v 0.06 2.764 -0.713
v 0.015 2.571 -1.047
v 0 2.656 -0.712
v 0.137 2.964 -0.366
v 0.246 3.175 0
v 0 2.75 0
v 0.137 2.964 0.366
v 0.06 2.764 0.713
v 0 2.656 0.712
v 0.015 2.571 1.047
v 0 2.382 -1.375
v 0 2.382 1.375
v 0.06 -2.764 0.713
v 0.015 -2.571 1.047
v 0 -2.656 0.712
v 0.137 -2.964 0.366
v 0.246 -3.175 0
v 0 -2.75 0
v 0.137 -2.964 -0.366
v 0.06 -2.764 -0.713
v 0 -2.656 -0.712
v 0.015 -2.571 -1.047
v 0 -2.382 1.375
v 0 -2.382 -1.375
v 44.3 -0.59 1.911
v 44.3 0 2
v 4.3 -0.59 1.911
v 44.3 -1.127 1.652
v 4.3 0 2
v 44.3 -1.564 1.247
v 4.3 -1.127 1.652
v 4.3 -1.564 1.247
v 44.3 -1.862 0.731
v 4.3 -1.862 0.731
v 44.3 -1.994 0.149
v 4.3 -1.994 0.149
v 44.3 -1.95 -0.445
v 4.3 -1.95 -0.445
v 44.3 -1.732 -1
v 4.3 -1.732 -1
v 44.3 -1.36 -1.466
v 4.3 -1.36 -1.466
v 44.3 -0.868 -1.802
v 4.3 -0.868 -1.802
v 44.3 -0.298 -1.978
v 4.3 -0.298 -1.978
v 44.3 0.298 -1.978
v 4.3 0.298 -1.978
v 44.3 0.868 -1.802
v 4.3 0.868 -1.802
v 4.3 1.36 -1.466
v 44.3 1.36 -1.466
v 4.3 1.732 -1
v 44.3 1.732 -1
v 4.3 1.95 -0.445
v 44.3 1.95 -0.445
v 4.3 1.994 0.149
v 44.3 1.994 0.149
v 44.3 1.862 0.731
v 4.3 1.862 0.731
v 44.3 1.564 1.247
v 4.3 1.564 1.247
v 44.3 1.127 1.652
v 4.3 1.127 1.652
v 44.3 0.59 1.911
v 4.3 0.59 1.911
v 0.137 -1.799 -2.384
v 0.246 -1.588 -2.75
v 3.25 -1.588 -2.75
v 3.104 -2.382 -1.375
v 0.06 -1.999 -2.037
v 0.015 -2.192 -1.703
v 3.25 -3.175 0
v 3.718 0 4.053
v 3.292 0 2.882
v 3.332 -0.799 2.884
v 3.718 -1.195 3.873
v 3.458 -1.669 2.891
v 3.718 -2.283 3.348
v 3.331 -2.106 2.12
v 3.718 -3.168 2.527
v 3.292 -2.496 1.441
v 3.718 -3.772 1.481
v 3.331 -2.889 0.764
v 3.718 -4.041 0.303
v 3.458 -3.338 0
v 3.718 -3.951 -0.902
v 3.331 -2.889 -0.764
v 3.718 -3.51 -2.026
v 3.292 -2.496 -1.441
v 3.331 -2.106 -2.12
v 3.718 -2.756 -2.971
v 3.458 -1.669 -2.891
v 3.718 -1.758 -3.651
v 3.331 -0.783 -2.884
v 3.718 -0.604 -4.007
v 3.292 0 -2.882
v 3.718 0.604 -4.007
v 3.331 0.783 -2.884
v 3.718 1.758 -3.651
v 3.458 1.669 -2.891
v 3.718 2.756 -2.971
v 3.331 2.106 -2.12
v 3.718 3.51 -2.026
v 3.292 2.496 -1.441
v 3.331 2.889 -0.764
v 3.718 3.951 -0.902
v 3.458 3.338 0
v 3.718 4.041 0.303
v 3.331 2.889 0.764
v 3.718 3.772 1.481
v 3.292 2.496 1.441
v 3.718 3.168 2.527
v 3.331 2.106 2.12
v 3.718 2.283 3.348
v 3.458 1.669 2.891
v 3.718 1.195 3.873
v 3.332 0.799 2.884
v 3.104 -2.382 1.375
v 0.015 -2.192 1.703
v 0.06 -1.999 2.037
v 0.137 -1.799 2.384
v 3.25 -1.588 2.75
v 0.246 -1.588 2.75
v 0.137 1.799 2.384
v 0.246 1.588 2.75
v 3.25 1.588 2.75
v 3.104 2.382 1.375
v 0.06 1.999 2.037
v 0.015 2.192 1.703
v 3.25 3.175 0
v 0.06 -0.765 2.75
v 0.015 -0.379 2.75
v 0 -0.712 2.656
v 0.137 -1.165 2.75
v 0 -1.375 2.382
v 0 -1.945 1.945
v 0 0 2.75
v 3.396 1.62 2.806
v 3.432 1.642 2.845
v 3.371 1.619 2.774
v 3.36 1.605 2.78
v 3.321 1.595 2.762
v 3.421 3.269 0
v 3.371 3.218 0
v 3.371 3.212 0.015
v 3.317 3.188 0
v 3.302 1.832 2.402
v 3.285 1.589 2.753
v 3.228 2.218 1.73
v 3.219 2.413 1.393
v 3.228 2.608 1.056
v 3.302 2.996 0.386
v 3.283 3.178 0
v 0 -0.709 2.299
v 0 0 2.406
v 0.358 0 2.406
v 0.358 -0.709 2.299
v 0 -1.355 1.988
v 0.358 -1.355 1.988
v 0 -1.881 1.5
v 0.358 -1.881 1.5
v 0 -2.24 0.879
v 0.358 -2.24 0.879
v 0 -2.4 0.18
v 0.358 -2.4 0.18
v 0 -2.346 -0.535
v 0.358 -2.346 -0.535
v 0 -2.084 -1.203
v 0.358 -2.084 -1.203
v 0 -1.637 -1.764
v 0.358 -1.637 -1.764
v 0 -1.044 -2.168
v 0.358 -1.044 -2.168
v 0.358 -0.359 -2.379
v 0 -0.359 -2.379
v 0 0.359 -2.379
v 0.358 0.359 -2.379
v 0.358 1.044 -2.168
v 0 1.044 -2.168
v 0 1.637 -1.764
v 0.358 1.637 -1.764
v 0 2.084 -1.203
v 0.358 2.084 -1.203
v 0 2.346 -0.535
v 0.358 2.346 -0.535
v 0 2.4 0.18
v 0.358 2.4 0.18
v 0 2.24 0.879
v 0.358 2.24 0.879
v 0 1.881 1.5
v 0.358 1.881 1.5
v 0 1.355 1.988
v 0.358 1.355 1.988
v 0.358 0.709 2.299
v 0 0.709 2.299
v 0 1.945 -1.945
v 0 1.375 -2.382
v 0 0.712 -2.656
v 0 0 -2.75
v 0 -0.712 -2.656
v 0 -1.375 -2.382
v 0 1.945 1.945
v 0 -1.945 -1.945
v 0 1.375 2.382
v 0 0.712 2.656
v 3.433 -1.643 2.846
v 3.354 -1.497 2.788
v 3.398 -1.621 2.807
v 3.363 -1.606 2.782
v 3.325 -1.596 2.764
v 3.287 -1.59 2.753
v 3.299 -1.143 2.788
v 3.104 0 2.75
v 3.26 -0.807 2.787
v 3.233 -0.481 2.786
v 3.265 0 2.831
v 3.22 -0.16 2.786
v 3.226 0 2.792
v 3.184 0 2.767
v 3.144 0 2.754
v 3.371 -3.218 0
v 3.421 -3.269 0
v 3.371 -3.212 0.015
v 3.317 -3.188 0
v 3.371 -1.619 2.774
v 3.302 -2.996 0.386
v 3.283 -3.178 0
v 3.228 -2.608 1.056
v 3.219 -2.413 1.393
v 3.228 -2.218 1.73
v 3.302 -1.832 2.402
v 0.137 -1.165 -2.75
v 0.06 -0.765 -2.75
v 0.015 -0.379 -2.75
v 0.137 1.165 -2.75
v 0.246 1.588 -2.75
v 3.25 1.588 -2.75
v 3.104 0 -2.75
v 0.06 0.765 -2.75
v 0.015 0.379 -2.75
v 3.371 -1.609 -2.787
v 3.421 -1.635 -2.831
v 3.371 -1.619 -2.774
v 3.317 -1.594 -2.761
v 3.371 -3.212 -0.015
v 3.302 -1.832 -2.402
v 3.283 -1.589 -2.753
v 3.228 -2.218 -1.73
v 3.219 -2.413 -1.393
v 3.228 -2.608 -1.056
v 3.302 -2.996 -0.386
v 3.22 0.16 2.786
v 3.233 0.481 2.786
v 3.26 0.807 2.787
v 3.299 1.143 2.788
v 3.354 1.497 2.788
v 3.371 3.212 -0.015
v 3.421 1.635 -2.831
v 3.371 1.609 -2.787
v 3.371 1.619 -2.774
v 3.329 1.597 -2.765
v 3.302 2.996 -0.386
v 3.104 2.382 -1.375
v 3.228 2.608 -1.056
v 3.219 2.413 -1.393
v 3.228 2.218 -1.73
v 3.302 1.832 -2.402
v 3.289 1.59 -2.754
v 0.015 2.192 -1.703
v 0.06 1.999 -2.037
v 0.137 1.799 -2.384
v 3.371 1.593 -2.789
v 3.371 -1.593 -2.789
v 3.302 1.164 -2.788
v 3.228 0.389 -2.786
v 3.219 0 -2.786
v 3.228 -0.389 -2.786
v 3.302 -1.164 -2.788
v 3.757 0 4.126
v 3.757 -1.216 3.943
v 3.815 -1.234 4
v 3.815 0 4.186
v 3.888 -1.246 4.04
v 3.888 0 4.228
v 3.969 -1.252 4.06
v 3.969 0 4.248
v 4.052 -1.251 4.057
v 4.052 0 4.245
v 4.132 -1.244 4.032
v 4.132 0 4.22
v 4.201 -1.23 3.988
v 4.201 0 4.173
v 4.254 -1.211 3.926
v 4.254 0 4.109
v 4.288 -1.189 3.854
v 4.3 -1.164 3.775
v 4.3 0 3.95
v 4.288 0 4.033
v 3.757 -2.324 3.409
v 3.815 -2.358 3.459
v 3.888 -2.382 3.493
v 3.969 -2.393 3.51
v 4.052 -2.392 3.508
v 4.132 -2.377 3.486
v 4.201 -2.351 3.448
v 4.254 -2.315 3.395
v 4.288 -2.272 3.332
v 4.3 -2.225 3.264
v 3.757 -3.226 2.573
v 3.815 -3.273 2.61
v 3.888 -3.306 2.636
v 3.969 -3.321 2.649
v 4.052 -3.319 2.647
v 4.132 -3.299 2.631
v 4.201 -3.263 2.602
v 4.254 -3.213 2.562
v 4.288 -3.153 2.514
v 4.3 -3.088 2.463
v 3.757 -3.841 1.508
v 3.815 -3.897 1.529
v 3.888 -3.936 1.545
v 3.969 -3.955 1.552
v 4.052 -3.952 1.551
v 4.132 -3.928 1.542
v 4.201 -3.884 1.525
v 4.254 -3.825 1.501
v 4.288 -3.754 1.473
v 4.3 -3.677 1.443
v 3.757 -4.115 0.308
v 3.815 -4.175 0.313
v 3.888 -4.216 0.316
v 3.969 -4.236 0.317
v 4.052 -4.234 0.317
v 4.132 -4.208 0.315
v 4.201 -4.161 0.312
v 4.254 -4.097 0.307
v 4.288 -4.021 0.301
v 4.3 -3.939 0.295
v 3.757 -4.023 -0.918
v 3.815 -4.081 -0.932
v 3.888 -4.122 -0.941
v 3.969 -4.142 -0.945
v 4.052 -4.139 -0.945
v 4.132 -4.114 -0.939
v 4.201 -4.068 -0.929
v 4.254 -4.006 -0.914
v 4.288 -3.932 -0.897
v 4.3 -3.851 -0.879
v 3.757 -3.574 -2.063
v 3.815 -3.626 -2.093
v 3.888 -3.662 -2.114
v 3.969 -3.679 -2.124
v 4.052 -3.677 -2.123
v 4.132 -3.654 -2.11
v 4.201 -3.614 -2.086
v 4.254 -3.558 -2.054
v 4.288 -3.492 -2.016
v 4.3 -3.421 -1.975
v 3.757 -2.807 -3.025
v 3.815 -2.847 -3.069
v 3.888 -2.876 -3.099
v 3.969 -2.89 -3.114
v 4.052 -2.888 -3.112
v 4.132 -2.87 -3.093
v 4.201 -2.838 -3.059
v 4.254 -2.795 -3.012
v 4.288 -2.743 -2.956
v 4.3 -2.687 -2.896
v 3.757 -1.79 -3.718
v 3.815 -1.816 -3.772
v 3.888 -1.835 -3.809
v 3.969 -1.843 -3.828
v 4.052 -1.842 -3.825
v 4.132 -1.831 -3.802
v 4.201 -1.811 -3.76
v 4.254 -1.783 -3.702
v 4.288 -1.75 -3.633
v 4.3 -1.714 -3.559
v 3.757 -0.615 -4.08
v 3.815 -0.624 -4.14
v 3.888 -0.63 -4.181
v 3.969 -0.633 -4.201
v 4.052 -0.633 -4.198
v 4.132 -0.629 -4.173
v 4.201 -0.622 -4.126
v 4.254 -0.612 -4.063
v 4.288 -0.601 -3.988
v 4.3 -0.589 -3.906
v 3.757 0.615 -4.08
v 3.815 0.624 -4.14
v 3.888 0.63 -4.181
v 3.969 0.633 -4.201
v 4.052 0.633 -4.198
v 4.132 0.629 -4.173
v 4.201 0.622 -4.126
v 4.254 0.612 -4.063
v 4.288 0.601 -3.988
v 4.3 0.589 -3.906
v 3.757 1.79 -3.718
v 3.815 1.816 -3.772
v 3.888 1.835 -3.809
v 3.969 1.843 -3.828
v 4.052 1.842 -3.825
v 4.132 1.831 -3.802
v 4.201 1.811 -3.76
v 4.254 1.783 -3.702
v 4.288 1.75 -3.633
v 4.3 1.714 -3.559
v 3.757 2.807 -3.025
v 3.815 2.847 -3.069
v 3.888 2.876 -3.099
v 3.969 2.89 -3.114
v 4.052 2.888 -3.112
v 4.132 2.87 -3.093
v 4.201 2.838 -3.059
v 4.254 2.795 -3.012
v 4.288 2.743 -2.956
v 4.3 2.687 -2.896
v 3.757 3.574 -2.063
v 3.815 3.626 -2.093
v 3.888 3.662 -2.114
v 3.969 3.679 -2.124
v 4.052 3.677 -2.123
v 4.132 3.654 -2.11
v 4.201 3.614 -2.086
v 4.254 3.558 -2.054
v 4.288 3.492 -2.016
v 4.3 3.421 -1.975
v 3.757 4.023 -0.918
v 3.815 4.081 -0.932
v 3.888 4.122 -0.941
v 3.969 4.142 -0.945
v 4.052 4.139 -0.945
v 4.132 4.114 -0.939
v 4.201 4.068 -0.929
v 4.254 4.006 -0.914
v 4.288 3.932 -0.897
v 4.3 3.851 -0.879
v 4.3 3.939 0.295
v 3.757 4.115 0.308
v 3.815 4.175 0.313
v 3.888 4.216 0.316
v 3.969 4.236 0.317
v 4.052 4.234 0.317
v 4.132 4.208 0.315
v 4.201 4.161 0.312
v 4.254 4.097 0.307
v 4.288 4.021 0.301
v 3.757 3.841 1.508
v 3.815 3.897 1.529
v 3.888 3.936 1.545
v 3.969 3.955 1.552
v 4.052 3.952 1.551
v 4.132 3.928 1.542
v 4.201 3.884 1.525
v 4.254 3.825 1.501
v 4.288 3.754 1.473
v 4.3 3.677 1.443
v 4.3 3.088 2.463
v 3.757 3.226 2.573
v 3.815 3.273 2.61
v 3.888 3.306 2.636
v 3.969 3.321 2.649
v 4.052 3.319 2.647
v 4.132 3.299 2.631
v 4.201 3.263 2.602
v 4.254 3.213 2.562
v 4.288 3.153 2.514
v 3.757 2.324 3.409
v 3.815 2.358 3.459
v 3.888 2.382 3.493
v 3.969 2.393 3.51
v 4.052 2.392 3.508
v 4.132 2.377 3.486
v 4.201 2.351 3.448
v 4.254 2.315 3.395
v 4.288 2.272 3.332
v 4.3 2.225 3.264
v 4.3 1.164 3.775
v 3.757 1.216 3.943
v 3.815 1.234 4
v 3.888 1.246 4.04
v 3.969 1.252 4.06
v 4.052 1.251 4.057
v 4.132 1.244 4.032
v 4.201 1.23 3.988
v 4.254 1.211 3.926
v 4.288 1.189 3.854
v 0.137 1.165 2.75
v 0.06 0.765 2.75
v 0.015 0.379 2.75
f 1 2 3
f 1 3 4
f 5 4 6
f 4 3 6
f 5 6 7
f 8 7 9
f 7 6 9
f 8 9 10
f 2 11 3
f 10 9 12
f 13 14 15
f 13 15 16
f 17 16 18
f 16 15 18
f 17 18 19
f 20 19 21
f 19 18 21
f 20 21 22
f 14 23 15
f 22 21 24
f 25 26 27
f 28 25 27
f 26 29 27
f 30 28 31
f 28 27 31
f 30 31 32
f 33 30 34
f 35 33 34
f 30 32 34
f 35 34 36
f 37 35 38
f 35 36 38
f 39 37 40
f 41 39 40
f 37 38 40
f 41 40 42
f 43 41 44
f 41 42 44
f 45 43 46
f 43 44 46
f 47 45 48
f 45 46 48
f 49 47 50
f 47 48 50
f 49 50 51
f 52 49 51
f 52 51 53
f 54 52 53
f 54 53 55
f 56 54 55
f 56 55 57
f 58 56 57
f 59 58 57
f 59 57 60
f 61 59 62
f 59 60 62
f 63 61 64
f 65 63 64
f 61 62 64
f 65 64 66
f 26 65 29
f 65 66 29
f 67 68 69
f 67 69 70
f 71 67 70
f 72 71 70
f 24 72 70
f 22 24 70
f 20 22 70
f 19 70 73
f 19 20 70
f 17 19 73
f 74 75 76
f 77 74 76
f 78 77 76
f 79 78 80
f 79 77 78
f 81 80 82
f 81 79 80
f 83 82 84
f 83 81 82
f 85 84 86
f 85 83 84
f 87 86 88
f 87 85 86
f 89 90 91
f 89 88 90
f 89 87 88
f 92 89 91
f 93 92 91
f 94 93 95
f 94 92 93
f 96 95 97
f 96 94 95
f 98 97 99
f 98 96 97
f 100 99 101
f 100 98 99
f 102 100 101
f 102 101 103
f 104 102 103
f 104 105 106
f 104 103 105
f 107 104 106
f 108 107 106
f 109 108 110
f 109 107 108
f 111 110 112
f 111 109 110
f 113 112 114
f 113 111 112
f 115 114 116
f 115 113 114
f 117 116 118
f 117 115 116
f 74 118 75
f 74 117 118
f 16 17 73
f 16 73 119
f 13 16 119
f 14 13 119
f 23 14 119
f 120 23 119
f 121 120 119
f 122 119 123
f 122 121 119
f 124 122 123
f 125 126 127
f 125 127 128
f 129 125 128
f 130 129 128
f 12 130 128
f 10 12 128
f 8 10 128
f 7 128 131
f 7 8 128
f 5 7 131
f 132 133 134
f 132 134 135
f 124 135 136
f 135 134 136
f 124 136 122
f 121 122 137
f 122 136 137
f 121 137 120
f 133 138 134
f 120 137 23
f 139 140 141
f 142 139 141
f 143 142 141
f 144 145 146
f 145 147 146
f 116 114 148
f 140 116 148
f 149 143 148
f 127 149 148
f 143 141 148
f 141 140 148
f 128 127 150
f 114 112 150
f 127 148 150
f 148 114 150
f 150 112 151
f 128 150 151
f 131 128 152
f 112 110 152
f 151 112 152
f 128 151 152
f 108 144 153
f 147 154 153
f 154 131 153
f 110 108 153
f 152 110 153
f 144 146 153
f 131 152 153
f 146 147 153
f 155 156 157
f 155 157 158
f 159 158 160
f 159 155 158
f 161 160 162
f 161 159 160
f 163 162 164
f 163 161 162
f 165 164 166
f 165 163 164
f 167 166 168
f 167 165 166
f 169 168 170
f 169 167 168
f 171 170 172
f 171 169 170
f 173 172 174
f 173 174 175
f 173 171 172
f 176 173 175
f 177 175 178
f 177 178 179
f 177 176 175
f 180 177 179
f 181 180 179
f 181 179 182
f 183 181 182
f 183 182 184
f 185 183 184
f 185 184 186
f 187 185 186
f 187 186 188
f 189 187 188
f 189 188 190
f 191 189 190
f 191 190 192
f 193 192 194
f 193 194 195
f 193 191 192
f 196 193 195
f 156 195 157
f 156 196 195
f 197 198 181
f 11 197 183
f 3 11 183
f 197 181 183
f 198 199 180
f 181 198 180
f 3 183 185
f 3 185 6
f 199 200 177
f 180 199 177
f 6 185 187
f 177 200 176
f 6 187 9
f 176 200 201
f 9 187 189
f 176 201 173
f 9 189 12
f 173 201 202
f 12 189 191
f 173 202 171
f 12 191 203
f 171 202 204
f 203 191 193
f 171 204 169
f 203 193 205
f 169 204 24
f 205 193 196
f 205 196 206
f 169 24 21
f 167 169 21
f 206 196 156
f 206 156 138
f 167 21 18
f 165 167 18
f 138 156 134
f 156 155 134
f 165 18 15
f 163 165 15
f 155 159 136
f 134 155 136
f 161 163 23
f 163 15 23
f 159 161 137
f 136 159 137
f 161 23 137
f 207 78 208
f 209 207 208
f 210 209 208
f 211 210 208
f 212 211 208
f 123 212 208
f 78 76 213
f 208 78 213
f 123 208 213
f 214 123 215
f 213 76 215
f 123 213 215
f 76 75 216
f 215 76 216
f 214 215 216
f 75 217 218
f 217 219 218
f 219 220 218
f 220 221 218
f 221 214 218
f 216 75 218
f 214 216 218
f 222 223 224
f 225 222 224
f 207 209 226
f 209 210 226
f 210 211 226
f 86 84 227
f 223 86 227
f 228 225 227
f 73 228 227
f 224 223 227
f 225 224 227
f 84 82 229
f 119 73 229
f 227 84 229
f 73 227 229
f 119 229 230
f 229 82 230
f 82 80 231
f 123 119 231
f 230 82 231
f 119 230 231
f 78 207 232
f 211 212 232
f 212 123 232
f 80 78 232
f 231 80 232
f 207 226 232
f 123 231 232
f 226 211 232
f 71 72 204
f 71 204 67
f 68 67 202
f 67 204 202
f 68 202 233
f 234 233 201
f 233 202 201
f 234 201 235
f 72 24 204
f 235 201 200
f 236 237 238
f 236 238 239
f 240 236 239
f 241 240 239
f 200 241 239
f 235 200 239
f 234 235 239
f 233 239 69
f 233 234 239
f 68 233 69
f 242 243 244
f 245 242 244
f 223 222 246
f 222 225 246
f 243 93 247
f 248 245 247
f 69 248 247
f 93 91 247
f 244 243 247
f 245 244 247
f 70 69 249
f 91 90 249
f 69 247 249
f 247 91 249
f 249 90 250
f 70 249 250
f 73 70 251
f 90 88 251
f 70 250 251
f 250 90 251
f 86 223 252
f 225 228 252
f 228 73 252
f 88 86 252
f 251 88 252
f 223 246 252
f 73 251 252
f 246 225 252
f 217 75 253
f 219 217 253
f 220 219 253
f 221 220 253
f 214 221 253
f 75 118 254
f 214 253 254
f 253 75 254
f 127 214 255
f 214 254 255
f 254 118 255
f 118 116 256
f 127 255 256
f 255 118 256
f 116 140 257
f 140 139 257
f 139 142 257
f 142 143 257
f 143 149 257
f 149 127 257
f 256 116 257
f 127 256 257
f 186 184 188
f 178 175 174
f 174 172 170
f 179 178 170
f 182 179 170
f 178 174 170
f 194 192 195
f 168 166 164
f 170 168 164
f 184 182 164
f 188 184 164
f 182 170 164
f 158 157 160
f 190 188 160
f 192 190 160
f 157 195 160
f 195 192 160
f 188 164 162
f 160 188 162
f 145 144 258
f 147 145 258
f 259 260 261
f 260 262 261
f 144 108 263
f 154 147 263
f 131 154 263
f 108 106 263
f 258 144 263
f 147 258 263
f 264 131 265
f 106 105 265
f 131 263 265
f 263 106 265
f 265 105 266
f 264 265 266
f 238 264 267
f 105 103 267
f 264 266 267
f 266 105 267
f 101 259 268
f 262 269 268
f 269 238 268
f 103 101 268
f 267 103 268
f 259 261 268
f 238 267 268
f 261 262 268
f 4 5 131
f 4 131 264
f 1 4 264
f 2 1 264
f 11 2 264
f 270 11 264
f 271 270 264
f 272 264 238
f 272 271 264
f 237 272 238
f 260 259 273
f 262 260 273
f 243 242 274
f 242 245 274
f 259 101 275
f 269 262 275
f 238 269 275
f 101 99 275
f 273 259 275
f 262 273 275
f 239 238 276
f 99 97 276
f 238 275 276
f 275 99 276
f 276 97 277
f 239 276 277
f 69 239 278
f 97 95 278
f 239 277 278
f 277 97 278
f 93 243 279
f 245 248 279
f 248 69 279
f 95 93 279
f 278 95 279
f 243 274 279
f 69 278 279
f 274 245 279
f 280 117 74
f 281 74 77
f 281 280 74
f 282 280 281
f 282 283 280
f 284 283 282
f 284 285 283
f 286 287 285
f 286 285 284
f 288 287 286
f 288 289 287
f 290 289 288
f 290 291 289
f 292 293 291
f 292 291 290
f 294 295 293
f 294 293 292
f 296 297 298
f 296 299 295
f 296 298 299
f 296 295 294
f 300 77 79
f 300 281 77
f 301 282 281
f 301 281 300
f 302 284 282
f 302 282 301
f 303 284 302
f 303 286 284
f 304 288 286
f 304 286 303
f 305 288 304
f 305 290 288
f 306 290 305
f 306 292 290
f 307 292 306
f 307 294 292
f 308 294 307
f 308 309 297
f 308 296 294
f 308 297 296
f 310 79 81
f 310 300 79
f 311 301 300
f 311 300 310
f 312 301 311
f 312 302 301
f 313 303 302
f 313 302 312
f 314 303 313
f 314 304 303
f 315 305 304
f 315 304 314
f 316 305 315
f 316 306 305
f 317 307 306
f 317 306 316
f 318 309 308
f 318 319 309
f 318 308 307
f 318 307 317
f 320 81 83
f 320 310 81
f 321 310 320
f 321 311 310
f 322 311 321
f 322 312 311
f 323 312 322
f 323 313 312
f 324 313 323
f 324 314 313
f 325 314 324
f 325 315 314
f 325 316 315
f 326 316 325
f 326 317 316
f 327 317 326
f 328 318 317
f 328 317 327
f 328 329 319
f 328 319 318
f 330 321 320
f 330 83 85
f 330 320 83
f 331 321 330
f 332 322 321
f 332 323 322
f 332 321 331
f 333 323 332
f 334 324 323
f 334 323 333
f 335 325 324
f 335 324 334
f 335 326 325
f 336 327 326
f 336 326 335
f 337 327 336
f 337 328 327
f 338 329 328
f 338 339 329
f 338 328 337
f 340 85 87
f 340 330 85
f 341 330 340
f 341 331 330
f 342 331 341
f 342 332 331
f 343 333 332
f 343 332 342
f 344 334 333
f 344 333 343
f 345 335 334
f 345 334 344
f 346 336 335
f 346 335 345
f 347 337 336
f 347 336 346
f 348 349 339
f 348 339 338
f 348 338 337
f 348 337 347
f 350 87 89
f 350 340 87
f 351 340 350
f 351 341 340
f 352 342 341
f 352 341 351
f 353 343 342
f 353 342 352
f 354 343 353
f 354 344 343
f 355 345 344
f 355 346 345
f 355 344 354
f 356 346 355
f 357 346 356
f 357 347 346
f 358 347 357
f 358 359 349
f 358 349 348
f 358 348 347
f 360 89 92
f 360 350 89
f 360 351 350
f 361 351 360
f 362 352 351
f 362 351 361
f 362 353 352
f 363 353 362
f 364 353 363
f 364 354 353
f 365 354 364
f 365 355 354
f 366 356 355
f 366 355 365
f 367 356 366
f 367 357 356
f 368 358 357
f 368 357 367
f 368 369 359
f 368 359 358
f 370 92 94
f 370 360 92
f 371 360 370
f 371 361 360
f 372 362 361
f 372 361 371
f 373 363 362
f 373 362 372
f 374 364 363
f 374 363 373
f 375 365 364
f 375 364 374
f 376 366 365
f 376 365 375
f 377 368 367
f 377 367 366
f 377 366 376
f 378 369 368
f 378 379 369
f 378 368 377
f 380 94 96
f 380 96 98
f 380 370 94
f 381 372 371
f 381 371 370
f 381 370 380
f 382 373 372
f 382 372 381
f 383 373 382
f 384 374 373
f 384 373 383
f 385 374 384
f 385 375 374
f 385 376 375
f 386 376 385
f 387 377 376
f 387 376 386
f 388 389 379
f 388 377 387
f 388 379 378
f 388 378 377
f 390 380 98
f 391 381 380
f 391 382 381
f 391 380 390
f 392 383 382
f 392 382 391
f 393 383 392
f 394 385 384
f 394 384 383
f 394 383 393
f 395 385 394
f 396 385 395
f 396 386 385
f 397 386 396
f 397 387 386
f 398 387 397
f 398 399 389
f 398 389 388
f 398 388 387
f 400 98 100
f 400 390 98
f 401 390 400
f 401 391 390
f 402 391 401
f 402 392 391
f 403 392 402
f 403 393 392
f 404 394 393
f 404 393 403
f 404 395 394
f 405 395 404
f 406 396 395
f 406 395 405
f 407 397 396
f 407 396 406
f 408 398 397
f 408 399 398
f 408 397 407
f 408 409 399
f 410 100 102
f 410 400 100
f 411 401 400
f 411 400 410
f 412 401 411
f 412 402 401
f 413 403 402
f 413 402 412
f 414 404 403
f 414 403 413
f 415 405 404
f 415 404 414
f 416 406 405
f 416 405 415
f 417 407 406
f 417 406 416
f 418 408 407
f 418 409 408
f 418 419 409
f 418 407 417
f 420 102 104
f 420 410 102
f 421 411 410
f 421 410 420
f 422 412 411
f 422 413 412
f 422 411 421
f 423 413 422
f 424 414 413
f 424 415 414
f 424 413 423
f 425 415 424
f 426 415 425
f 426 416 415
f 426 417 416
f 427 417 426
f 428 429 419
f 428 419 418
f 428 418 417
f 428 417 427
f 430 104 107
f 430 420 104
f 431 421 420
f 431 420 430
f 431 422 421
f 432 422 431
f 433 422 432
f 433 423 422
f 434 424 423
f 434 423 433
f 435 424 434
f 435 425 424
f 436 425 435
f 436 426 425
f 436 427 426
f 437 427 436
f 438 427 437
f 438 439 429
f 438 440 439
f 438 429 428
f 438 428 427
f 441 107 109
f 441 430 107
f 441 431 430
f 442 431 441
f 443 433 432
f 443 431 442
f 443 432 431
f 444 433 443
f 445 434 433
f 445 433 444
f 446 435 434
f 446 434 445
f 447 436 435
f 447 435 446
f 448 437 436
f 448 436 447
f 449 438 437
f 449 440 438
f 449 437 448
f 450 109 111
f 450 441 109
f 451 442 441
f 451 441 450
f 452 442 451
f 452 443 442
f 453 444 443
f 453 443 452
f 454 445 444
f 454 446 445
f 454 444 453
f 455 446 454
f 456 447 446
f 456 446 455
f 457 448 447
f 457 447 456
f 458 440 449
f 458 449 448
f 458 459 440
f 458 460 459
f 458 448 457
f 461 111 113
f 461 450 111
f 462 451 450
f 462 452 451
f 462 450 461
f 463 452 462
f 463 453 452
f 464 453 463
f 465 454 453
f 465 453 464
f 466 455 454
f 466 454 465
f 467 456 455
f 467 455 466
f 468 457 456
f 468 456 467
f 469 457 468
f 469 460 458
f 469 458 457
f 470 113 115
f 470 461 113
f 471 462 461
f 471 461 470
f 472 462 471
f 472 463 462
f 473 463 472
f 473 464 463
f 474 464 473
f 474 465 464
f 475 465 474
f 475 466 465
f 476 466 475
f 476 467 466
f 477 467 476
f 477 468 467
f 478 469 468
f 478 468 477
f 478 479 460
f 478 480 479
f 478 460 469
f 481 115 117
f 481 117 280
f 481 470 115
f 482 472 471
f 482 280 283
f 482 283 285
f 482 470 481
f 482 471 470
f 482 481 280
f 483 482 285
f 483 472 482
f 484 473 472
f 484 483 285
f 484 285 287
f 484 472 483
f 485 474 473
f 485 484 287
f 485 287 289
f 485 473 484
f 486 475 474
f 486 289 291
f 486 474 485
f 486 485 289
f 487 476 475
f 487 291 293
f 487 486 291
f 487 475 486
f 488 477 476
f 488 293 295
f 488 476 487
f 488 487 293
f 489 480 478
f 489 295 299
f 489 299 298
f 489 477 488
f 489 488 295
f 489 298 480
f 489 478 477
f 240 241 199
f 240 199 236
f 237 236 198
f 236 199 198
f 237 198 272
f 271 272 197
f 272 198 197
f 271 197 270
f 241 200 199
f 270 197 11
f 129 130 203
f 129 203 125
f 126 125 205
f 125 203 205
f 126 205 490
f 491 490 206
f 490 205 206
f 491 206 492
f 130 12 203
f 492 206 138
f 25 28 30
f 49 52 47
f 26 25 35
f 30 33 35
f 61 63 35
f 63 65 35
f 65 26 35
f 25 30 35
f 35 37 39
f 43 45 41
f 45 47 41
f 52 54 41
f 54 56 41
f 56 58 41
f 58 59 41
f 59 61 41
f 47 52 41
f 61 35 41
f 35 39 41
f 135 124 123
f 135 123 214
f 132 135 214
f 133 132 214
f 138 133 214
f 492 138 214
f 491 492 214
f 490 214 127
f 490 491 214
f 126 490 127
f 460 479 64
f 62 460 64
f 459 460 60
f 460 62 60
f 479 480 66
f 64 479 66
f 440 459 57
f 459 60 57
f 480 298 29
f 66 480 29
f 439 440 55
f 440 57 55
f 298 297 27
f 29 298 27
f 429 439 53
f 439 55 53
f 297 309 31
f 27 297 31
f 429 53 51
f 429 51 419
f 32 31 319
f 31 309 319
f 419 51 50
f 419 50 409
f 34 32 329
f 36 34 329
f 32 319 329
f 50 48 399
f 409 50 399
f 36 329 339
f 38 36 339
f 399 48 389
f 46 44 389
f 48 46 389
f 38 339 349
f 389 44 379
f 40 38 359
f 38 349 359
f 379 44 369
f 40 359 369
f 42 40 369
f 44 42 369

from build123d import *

# Parameters (mm, degrees)
SKETCH2_R         = 3.207274827
HEX_DIE_DEPTH     = 4.3
FLANGEHEXFILLET_R = 0.2
SKETCH4_R         = 2.40625
INDENT_DEPTH      = 0.358333333


with BuildPart() as part:
    # BodySke → Base-Revolve (revolve)
    with BuildSketch(Plane.XY, mode=Mode.PRIVATE) as base_revolve_sk:
        Polygon((4.3, 2), (4.3, 3.17551963), (0.245673873, 3.17551963), (0, 2.75), (0, 0), (44.3, 0), (44.3, 2), align=None)
    revolve(base_revolve_sk.sketch.rotate(Axis((-25.4, 0, 0), (1, 0, 0)), 90), axis=Axis((-25.4, 0, 0), (1, 0, 0)))

    # Sketch2 → Hex-Die (cut)
    with BuildSketch(Plane(origin=(0, 0, 0), x_dir=(0, 0, -1), z_dir=(1, 0, 0))):
        Circle(SKETCH2_R)
        Polygon((-2.75, 1.587713247), (0, 3.175426494), (2.75, 1.587713247), (2.75, -1.587713247), (0, -3.175426494), (-2.75, -1.587713247), align=None, mode=Mode.SUBTRACT)
    extrude(amount=HEX_DIE_DEPTH, mode=Mode.SUBTRACT)

    # Sketch5 → Flange (revolve)
    with BuildSketch(Plane.XY, mode=Mode.PRIVATE) as flange_sk:
        with BuildLine():
            Line((2.243064243, 0), (3.718092214, 4.052606043))
            ThreePointArc((3.718092214, 4.052606043), (4.052094453, 4.245442326), (4.3, 3.95))
            Line((4.3, 3.95), (4.3, 0))
            Line((4.3, 0), (2.243064243, 0))
        make_face()
    revolve(flange_sk.sketch.rotate(Axis((0, 0, 0), (1, 0, 0)), 90), axis=Axis((0, 0, 0), (1, 0, 0)))

    # FlangeHexFillet
    flangehexfillet_edges = [part.edges().sort_by_distance(p)[0] for p in [
        (3.285203168, 0.797319684, 2.75),
        (3.24398239, 2.381569871, 1.375),
        (3.24398239, 2.381569871, -1.375),
        (3.243982387, 0, -2.75),
        (3.24398239, -2.381569871, -1.375),
        (3.24398239, -2.381569871, 1.375),
        (3.285203168, -0.797319684, 2.75),
    ]]
    fillet(flangehexfillet_edges, radius=FLANGEHEXFILLET_R)

    # Sketch4 → Indent (cut)
    with BuildSketch(Plane(origin=(0, 0, 0), x_dir=(0, 0, -1), z_dir=(1, 0, 0))):
        with Locations(Location((0, 0, 0), (0, 0, 180))):
            Circle(SKETCH4_R)
    extrude(amount=INDENT_DEPTH, mode=Mode.SUBTRACT)


solid = part.part
